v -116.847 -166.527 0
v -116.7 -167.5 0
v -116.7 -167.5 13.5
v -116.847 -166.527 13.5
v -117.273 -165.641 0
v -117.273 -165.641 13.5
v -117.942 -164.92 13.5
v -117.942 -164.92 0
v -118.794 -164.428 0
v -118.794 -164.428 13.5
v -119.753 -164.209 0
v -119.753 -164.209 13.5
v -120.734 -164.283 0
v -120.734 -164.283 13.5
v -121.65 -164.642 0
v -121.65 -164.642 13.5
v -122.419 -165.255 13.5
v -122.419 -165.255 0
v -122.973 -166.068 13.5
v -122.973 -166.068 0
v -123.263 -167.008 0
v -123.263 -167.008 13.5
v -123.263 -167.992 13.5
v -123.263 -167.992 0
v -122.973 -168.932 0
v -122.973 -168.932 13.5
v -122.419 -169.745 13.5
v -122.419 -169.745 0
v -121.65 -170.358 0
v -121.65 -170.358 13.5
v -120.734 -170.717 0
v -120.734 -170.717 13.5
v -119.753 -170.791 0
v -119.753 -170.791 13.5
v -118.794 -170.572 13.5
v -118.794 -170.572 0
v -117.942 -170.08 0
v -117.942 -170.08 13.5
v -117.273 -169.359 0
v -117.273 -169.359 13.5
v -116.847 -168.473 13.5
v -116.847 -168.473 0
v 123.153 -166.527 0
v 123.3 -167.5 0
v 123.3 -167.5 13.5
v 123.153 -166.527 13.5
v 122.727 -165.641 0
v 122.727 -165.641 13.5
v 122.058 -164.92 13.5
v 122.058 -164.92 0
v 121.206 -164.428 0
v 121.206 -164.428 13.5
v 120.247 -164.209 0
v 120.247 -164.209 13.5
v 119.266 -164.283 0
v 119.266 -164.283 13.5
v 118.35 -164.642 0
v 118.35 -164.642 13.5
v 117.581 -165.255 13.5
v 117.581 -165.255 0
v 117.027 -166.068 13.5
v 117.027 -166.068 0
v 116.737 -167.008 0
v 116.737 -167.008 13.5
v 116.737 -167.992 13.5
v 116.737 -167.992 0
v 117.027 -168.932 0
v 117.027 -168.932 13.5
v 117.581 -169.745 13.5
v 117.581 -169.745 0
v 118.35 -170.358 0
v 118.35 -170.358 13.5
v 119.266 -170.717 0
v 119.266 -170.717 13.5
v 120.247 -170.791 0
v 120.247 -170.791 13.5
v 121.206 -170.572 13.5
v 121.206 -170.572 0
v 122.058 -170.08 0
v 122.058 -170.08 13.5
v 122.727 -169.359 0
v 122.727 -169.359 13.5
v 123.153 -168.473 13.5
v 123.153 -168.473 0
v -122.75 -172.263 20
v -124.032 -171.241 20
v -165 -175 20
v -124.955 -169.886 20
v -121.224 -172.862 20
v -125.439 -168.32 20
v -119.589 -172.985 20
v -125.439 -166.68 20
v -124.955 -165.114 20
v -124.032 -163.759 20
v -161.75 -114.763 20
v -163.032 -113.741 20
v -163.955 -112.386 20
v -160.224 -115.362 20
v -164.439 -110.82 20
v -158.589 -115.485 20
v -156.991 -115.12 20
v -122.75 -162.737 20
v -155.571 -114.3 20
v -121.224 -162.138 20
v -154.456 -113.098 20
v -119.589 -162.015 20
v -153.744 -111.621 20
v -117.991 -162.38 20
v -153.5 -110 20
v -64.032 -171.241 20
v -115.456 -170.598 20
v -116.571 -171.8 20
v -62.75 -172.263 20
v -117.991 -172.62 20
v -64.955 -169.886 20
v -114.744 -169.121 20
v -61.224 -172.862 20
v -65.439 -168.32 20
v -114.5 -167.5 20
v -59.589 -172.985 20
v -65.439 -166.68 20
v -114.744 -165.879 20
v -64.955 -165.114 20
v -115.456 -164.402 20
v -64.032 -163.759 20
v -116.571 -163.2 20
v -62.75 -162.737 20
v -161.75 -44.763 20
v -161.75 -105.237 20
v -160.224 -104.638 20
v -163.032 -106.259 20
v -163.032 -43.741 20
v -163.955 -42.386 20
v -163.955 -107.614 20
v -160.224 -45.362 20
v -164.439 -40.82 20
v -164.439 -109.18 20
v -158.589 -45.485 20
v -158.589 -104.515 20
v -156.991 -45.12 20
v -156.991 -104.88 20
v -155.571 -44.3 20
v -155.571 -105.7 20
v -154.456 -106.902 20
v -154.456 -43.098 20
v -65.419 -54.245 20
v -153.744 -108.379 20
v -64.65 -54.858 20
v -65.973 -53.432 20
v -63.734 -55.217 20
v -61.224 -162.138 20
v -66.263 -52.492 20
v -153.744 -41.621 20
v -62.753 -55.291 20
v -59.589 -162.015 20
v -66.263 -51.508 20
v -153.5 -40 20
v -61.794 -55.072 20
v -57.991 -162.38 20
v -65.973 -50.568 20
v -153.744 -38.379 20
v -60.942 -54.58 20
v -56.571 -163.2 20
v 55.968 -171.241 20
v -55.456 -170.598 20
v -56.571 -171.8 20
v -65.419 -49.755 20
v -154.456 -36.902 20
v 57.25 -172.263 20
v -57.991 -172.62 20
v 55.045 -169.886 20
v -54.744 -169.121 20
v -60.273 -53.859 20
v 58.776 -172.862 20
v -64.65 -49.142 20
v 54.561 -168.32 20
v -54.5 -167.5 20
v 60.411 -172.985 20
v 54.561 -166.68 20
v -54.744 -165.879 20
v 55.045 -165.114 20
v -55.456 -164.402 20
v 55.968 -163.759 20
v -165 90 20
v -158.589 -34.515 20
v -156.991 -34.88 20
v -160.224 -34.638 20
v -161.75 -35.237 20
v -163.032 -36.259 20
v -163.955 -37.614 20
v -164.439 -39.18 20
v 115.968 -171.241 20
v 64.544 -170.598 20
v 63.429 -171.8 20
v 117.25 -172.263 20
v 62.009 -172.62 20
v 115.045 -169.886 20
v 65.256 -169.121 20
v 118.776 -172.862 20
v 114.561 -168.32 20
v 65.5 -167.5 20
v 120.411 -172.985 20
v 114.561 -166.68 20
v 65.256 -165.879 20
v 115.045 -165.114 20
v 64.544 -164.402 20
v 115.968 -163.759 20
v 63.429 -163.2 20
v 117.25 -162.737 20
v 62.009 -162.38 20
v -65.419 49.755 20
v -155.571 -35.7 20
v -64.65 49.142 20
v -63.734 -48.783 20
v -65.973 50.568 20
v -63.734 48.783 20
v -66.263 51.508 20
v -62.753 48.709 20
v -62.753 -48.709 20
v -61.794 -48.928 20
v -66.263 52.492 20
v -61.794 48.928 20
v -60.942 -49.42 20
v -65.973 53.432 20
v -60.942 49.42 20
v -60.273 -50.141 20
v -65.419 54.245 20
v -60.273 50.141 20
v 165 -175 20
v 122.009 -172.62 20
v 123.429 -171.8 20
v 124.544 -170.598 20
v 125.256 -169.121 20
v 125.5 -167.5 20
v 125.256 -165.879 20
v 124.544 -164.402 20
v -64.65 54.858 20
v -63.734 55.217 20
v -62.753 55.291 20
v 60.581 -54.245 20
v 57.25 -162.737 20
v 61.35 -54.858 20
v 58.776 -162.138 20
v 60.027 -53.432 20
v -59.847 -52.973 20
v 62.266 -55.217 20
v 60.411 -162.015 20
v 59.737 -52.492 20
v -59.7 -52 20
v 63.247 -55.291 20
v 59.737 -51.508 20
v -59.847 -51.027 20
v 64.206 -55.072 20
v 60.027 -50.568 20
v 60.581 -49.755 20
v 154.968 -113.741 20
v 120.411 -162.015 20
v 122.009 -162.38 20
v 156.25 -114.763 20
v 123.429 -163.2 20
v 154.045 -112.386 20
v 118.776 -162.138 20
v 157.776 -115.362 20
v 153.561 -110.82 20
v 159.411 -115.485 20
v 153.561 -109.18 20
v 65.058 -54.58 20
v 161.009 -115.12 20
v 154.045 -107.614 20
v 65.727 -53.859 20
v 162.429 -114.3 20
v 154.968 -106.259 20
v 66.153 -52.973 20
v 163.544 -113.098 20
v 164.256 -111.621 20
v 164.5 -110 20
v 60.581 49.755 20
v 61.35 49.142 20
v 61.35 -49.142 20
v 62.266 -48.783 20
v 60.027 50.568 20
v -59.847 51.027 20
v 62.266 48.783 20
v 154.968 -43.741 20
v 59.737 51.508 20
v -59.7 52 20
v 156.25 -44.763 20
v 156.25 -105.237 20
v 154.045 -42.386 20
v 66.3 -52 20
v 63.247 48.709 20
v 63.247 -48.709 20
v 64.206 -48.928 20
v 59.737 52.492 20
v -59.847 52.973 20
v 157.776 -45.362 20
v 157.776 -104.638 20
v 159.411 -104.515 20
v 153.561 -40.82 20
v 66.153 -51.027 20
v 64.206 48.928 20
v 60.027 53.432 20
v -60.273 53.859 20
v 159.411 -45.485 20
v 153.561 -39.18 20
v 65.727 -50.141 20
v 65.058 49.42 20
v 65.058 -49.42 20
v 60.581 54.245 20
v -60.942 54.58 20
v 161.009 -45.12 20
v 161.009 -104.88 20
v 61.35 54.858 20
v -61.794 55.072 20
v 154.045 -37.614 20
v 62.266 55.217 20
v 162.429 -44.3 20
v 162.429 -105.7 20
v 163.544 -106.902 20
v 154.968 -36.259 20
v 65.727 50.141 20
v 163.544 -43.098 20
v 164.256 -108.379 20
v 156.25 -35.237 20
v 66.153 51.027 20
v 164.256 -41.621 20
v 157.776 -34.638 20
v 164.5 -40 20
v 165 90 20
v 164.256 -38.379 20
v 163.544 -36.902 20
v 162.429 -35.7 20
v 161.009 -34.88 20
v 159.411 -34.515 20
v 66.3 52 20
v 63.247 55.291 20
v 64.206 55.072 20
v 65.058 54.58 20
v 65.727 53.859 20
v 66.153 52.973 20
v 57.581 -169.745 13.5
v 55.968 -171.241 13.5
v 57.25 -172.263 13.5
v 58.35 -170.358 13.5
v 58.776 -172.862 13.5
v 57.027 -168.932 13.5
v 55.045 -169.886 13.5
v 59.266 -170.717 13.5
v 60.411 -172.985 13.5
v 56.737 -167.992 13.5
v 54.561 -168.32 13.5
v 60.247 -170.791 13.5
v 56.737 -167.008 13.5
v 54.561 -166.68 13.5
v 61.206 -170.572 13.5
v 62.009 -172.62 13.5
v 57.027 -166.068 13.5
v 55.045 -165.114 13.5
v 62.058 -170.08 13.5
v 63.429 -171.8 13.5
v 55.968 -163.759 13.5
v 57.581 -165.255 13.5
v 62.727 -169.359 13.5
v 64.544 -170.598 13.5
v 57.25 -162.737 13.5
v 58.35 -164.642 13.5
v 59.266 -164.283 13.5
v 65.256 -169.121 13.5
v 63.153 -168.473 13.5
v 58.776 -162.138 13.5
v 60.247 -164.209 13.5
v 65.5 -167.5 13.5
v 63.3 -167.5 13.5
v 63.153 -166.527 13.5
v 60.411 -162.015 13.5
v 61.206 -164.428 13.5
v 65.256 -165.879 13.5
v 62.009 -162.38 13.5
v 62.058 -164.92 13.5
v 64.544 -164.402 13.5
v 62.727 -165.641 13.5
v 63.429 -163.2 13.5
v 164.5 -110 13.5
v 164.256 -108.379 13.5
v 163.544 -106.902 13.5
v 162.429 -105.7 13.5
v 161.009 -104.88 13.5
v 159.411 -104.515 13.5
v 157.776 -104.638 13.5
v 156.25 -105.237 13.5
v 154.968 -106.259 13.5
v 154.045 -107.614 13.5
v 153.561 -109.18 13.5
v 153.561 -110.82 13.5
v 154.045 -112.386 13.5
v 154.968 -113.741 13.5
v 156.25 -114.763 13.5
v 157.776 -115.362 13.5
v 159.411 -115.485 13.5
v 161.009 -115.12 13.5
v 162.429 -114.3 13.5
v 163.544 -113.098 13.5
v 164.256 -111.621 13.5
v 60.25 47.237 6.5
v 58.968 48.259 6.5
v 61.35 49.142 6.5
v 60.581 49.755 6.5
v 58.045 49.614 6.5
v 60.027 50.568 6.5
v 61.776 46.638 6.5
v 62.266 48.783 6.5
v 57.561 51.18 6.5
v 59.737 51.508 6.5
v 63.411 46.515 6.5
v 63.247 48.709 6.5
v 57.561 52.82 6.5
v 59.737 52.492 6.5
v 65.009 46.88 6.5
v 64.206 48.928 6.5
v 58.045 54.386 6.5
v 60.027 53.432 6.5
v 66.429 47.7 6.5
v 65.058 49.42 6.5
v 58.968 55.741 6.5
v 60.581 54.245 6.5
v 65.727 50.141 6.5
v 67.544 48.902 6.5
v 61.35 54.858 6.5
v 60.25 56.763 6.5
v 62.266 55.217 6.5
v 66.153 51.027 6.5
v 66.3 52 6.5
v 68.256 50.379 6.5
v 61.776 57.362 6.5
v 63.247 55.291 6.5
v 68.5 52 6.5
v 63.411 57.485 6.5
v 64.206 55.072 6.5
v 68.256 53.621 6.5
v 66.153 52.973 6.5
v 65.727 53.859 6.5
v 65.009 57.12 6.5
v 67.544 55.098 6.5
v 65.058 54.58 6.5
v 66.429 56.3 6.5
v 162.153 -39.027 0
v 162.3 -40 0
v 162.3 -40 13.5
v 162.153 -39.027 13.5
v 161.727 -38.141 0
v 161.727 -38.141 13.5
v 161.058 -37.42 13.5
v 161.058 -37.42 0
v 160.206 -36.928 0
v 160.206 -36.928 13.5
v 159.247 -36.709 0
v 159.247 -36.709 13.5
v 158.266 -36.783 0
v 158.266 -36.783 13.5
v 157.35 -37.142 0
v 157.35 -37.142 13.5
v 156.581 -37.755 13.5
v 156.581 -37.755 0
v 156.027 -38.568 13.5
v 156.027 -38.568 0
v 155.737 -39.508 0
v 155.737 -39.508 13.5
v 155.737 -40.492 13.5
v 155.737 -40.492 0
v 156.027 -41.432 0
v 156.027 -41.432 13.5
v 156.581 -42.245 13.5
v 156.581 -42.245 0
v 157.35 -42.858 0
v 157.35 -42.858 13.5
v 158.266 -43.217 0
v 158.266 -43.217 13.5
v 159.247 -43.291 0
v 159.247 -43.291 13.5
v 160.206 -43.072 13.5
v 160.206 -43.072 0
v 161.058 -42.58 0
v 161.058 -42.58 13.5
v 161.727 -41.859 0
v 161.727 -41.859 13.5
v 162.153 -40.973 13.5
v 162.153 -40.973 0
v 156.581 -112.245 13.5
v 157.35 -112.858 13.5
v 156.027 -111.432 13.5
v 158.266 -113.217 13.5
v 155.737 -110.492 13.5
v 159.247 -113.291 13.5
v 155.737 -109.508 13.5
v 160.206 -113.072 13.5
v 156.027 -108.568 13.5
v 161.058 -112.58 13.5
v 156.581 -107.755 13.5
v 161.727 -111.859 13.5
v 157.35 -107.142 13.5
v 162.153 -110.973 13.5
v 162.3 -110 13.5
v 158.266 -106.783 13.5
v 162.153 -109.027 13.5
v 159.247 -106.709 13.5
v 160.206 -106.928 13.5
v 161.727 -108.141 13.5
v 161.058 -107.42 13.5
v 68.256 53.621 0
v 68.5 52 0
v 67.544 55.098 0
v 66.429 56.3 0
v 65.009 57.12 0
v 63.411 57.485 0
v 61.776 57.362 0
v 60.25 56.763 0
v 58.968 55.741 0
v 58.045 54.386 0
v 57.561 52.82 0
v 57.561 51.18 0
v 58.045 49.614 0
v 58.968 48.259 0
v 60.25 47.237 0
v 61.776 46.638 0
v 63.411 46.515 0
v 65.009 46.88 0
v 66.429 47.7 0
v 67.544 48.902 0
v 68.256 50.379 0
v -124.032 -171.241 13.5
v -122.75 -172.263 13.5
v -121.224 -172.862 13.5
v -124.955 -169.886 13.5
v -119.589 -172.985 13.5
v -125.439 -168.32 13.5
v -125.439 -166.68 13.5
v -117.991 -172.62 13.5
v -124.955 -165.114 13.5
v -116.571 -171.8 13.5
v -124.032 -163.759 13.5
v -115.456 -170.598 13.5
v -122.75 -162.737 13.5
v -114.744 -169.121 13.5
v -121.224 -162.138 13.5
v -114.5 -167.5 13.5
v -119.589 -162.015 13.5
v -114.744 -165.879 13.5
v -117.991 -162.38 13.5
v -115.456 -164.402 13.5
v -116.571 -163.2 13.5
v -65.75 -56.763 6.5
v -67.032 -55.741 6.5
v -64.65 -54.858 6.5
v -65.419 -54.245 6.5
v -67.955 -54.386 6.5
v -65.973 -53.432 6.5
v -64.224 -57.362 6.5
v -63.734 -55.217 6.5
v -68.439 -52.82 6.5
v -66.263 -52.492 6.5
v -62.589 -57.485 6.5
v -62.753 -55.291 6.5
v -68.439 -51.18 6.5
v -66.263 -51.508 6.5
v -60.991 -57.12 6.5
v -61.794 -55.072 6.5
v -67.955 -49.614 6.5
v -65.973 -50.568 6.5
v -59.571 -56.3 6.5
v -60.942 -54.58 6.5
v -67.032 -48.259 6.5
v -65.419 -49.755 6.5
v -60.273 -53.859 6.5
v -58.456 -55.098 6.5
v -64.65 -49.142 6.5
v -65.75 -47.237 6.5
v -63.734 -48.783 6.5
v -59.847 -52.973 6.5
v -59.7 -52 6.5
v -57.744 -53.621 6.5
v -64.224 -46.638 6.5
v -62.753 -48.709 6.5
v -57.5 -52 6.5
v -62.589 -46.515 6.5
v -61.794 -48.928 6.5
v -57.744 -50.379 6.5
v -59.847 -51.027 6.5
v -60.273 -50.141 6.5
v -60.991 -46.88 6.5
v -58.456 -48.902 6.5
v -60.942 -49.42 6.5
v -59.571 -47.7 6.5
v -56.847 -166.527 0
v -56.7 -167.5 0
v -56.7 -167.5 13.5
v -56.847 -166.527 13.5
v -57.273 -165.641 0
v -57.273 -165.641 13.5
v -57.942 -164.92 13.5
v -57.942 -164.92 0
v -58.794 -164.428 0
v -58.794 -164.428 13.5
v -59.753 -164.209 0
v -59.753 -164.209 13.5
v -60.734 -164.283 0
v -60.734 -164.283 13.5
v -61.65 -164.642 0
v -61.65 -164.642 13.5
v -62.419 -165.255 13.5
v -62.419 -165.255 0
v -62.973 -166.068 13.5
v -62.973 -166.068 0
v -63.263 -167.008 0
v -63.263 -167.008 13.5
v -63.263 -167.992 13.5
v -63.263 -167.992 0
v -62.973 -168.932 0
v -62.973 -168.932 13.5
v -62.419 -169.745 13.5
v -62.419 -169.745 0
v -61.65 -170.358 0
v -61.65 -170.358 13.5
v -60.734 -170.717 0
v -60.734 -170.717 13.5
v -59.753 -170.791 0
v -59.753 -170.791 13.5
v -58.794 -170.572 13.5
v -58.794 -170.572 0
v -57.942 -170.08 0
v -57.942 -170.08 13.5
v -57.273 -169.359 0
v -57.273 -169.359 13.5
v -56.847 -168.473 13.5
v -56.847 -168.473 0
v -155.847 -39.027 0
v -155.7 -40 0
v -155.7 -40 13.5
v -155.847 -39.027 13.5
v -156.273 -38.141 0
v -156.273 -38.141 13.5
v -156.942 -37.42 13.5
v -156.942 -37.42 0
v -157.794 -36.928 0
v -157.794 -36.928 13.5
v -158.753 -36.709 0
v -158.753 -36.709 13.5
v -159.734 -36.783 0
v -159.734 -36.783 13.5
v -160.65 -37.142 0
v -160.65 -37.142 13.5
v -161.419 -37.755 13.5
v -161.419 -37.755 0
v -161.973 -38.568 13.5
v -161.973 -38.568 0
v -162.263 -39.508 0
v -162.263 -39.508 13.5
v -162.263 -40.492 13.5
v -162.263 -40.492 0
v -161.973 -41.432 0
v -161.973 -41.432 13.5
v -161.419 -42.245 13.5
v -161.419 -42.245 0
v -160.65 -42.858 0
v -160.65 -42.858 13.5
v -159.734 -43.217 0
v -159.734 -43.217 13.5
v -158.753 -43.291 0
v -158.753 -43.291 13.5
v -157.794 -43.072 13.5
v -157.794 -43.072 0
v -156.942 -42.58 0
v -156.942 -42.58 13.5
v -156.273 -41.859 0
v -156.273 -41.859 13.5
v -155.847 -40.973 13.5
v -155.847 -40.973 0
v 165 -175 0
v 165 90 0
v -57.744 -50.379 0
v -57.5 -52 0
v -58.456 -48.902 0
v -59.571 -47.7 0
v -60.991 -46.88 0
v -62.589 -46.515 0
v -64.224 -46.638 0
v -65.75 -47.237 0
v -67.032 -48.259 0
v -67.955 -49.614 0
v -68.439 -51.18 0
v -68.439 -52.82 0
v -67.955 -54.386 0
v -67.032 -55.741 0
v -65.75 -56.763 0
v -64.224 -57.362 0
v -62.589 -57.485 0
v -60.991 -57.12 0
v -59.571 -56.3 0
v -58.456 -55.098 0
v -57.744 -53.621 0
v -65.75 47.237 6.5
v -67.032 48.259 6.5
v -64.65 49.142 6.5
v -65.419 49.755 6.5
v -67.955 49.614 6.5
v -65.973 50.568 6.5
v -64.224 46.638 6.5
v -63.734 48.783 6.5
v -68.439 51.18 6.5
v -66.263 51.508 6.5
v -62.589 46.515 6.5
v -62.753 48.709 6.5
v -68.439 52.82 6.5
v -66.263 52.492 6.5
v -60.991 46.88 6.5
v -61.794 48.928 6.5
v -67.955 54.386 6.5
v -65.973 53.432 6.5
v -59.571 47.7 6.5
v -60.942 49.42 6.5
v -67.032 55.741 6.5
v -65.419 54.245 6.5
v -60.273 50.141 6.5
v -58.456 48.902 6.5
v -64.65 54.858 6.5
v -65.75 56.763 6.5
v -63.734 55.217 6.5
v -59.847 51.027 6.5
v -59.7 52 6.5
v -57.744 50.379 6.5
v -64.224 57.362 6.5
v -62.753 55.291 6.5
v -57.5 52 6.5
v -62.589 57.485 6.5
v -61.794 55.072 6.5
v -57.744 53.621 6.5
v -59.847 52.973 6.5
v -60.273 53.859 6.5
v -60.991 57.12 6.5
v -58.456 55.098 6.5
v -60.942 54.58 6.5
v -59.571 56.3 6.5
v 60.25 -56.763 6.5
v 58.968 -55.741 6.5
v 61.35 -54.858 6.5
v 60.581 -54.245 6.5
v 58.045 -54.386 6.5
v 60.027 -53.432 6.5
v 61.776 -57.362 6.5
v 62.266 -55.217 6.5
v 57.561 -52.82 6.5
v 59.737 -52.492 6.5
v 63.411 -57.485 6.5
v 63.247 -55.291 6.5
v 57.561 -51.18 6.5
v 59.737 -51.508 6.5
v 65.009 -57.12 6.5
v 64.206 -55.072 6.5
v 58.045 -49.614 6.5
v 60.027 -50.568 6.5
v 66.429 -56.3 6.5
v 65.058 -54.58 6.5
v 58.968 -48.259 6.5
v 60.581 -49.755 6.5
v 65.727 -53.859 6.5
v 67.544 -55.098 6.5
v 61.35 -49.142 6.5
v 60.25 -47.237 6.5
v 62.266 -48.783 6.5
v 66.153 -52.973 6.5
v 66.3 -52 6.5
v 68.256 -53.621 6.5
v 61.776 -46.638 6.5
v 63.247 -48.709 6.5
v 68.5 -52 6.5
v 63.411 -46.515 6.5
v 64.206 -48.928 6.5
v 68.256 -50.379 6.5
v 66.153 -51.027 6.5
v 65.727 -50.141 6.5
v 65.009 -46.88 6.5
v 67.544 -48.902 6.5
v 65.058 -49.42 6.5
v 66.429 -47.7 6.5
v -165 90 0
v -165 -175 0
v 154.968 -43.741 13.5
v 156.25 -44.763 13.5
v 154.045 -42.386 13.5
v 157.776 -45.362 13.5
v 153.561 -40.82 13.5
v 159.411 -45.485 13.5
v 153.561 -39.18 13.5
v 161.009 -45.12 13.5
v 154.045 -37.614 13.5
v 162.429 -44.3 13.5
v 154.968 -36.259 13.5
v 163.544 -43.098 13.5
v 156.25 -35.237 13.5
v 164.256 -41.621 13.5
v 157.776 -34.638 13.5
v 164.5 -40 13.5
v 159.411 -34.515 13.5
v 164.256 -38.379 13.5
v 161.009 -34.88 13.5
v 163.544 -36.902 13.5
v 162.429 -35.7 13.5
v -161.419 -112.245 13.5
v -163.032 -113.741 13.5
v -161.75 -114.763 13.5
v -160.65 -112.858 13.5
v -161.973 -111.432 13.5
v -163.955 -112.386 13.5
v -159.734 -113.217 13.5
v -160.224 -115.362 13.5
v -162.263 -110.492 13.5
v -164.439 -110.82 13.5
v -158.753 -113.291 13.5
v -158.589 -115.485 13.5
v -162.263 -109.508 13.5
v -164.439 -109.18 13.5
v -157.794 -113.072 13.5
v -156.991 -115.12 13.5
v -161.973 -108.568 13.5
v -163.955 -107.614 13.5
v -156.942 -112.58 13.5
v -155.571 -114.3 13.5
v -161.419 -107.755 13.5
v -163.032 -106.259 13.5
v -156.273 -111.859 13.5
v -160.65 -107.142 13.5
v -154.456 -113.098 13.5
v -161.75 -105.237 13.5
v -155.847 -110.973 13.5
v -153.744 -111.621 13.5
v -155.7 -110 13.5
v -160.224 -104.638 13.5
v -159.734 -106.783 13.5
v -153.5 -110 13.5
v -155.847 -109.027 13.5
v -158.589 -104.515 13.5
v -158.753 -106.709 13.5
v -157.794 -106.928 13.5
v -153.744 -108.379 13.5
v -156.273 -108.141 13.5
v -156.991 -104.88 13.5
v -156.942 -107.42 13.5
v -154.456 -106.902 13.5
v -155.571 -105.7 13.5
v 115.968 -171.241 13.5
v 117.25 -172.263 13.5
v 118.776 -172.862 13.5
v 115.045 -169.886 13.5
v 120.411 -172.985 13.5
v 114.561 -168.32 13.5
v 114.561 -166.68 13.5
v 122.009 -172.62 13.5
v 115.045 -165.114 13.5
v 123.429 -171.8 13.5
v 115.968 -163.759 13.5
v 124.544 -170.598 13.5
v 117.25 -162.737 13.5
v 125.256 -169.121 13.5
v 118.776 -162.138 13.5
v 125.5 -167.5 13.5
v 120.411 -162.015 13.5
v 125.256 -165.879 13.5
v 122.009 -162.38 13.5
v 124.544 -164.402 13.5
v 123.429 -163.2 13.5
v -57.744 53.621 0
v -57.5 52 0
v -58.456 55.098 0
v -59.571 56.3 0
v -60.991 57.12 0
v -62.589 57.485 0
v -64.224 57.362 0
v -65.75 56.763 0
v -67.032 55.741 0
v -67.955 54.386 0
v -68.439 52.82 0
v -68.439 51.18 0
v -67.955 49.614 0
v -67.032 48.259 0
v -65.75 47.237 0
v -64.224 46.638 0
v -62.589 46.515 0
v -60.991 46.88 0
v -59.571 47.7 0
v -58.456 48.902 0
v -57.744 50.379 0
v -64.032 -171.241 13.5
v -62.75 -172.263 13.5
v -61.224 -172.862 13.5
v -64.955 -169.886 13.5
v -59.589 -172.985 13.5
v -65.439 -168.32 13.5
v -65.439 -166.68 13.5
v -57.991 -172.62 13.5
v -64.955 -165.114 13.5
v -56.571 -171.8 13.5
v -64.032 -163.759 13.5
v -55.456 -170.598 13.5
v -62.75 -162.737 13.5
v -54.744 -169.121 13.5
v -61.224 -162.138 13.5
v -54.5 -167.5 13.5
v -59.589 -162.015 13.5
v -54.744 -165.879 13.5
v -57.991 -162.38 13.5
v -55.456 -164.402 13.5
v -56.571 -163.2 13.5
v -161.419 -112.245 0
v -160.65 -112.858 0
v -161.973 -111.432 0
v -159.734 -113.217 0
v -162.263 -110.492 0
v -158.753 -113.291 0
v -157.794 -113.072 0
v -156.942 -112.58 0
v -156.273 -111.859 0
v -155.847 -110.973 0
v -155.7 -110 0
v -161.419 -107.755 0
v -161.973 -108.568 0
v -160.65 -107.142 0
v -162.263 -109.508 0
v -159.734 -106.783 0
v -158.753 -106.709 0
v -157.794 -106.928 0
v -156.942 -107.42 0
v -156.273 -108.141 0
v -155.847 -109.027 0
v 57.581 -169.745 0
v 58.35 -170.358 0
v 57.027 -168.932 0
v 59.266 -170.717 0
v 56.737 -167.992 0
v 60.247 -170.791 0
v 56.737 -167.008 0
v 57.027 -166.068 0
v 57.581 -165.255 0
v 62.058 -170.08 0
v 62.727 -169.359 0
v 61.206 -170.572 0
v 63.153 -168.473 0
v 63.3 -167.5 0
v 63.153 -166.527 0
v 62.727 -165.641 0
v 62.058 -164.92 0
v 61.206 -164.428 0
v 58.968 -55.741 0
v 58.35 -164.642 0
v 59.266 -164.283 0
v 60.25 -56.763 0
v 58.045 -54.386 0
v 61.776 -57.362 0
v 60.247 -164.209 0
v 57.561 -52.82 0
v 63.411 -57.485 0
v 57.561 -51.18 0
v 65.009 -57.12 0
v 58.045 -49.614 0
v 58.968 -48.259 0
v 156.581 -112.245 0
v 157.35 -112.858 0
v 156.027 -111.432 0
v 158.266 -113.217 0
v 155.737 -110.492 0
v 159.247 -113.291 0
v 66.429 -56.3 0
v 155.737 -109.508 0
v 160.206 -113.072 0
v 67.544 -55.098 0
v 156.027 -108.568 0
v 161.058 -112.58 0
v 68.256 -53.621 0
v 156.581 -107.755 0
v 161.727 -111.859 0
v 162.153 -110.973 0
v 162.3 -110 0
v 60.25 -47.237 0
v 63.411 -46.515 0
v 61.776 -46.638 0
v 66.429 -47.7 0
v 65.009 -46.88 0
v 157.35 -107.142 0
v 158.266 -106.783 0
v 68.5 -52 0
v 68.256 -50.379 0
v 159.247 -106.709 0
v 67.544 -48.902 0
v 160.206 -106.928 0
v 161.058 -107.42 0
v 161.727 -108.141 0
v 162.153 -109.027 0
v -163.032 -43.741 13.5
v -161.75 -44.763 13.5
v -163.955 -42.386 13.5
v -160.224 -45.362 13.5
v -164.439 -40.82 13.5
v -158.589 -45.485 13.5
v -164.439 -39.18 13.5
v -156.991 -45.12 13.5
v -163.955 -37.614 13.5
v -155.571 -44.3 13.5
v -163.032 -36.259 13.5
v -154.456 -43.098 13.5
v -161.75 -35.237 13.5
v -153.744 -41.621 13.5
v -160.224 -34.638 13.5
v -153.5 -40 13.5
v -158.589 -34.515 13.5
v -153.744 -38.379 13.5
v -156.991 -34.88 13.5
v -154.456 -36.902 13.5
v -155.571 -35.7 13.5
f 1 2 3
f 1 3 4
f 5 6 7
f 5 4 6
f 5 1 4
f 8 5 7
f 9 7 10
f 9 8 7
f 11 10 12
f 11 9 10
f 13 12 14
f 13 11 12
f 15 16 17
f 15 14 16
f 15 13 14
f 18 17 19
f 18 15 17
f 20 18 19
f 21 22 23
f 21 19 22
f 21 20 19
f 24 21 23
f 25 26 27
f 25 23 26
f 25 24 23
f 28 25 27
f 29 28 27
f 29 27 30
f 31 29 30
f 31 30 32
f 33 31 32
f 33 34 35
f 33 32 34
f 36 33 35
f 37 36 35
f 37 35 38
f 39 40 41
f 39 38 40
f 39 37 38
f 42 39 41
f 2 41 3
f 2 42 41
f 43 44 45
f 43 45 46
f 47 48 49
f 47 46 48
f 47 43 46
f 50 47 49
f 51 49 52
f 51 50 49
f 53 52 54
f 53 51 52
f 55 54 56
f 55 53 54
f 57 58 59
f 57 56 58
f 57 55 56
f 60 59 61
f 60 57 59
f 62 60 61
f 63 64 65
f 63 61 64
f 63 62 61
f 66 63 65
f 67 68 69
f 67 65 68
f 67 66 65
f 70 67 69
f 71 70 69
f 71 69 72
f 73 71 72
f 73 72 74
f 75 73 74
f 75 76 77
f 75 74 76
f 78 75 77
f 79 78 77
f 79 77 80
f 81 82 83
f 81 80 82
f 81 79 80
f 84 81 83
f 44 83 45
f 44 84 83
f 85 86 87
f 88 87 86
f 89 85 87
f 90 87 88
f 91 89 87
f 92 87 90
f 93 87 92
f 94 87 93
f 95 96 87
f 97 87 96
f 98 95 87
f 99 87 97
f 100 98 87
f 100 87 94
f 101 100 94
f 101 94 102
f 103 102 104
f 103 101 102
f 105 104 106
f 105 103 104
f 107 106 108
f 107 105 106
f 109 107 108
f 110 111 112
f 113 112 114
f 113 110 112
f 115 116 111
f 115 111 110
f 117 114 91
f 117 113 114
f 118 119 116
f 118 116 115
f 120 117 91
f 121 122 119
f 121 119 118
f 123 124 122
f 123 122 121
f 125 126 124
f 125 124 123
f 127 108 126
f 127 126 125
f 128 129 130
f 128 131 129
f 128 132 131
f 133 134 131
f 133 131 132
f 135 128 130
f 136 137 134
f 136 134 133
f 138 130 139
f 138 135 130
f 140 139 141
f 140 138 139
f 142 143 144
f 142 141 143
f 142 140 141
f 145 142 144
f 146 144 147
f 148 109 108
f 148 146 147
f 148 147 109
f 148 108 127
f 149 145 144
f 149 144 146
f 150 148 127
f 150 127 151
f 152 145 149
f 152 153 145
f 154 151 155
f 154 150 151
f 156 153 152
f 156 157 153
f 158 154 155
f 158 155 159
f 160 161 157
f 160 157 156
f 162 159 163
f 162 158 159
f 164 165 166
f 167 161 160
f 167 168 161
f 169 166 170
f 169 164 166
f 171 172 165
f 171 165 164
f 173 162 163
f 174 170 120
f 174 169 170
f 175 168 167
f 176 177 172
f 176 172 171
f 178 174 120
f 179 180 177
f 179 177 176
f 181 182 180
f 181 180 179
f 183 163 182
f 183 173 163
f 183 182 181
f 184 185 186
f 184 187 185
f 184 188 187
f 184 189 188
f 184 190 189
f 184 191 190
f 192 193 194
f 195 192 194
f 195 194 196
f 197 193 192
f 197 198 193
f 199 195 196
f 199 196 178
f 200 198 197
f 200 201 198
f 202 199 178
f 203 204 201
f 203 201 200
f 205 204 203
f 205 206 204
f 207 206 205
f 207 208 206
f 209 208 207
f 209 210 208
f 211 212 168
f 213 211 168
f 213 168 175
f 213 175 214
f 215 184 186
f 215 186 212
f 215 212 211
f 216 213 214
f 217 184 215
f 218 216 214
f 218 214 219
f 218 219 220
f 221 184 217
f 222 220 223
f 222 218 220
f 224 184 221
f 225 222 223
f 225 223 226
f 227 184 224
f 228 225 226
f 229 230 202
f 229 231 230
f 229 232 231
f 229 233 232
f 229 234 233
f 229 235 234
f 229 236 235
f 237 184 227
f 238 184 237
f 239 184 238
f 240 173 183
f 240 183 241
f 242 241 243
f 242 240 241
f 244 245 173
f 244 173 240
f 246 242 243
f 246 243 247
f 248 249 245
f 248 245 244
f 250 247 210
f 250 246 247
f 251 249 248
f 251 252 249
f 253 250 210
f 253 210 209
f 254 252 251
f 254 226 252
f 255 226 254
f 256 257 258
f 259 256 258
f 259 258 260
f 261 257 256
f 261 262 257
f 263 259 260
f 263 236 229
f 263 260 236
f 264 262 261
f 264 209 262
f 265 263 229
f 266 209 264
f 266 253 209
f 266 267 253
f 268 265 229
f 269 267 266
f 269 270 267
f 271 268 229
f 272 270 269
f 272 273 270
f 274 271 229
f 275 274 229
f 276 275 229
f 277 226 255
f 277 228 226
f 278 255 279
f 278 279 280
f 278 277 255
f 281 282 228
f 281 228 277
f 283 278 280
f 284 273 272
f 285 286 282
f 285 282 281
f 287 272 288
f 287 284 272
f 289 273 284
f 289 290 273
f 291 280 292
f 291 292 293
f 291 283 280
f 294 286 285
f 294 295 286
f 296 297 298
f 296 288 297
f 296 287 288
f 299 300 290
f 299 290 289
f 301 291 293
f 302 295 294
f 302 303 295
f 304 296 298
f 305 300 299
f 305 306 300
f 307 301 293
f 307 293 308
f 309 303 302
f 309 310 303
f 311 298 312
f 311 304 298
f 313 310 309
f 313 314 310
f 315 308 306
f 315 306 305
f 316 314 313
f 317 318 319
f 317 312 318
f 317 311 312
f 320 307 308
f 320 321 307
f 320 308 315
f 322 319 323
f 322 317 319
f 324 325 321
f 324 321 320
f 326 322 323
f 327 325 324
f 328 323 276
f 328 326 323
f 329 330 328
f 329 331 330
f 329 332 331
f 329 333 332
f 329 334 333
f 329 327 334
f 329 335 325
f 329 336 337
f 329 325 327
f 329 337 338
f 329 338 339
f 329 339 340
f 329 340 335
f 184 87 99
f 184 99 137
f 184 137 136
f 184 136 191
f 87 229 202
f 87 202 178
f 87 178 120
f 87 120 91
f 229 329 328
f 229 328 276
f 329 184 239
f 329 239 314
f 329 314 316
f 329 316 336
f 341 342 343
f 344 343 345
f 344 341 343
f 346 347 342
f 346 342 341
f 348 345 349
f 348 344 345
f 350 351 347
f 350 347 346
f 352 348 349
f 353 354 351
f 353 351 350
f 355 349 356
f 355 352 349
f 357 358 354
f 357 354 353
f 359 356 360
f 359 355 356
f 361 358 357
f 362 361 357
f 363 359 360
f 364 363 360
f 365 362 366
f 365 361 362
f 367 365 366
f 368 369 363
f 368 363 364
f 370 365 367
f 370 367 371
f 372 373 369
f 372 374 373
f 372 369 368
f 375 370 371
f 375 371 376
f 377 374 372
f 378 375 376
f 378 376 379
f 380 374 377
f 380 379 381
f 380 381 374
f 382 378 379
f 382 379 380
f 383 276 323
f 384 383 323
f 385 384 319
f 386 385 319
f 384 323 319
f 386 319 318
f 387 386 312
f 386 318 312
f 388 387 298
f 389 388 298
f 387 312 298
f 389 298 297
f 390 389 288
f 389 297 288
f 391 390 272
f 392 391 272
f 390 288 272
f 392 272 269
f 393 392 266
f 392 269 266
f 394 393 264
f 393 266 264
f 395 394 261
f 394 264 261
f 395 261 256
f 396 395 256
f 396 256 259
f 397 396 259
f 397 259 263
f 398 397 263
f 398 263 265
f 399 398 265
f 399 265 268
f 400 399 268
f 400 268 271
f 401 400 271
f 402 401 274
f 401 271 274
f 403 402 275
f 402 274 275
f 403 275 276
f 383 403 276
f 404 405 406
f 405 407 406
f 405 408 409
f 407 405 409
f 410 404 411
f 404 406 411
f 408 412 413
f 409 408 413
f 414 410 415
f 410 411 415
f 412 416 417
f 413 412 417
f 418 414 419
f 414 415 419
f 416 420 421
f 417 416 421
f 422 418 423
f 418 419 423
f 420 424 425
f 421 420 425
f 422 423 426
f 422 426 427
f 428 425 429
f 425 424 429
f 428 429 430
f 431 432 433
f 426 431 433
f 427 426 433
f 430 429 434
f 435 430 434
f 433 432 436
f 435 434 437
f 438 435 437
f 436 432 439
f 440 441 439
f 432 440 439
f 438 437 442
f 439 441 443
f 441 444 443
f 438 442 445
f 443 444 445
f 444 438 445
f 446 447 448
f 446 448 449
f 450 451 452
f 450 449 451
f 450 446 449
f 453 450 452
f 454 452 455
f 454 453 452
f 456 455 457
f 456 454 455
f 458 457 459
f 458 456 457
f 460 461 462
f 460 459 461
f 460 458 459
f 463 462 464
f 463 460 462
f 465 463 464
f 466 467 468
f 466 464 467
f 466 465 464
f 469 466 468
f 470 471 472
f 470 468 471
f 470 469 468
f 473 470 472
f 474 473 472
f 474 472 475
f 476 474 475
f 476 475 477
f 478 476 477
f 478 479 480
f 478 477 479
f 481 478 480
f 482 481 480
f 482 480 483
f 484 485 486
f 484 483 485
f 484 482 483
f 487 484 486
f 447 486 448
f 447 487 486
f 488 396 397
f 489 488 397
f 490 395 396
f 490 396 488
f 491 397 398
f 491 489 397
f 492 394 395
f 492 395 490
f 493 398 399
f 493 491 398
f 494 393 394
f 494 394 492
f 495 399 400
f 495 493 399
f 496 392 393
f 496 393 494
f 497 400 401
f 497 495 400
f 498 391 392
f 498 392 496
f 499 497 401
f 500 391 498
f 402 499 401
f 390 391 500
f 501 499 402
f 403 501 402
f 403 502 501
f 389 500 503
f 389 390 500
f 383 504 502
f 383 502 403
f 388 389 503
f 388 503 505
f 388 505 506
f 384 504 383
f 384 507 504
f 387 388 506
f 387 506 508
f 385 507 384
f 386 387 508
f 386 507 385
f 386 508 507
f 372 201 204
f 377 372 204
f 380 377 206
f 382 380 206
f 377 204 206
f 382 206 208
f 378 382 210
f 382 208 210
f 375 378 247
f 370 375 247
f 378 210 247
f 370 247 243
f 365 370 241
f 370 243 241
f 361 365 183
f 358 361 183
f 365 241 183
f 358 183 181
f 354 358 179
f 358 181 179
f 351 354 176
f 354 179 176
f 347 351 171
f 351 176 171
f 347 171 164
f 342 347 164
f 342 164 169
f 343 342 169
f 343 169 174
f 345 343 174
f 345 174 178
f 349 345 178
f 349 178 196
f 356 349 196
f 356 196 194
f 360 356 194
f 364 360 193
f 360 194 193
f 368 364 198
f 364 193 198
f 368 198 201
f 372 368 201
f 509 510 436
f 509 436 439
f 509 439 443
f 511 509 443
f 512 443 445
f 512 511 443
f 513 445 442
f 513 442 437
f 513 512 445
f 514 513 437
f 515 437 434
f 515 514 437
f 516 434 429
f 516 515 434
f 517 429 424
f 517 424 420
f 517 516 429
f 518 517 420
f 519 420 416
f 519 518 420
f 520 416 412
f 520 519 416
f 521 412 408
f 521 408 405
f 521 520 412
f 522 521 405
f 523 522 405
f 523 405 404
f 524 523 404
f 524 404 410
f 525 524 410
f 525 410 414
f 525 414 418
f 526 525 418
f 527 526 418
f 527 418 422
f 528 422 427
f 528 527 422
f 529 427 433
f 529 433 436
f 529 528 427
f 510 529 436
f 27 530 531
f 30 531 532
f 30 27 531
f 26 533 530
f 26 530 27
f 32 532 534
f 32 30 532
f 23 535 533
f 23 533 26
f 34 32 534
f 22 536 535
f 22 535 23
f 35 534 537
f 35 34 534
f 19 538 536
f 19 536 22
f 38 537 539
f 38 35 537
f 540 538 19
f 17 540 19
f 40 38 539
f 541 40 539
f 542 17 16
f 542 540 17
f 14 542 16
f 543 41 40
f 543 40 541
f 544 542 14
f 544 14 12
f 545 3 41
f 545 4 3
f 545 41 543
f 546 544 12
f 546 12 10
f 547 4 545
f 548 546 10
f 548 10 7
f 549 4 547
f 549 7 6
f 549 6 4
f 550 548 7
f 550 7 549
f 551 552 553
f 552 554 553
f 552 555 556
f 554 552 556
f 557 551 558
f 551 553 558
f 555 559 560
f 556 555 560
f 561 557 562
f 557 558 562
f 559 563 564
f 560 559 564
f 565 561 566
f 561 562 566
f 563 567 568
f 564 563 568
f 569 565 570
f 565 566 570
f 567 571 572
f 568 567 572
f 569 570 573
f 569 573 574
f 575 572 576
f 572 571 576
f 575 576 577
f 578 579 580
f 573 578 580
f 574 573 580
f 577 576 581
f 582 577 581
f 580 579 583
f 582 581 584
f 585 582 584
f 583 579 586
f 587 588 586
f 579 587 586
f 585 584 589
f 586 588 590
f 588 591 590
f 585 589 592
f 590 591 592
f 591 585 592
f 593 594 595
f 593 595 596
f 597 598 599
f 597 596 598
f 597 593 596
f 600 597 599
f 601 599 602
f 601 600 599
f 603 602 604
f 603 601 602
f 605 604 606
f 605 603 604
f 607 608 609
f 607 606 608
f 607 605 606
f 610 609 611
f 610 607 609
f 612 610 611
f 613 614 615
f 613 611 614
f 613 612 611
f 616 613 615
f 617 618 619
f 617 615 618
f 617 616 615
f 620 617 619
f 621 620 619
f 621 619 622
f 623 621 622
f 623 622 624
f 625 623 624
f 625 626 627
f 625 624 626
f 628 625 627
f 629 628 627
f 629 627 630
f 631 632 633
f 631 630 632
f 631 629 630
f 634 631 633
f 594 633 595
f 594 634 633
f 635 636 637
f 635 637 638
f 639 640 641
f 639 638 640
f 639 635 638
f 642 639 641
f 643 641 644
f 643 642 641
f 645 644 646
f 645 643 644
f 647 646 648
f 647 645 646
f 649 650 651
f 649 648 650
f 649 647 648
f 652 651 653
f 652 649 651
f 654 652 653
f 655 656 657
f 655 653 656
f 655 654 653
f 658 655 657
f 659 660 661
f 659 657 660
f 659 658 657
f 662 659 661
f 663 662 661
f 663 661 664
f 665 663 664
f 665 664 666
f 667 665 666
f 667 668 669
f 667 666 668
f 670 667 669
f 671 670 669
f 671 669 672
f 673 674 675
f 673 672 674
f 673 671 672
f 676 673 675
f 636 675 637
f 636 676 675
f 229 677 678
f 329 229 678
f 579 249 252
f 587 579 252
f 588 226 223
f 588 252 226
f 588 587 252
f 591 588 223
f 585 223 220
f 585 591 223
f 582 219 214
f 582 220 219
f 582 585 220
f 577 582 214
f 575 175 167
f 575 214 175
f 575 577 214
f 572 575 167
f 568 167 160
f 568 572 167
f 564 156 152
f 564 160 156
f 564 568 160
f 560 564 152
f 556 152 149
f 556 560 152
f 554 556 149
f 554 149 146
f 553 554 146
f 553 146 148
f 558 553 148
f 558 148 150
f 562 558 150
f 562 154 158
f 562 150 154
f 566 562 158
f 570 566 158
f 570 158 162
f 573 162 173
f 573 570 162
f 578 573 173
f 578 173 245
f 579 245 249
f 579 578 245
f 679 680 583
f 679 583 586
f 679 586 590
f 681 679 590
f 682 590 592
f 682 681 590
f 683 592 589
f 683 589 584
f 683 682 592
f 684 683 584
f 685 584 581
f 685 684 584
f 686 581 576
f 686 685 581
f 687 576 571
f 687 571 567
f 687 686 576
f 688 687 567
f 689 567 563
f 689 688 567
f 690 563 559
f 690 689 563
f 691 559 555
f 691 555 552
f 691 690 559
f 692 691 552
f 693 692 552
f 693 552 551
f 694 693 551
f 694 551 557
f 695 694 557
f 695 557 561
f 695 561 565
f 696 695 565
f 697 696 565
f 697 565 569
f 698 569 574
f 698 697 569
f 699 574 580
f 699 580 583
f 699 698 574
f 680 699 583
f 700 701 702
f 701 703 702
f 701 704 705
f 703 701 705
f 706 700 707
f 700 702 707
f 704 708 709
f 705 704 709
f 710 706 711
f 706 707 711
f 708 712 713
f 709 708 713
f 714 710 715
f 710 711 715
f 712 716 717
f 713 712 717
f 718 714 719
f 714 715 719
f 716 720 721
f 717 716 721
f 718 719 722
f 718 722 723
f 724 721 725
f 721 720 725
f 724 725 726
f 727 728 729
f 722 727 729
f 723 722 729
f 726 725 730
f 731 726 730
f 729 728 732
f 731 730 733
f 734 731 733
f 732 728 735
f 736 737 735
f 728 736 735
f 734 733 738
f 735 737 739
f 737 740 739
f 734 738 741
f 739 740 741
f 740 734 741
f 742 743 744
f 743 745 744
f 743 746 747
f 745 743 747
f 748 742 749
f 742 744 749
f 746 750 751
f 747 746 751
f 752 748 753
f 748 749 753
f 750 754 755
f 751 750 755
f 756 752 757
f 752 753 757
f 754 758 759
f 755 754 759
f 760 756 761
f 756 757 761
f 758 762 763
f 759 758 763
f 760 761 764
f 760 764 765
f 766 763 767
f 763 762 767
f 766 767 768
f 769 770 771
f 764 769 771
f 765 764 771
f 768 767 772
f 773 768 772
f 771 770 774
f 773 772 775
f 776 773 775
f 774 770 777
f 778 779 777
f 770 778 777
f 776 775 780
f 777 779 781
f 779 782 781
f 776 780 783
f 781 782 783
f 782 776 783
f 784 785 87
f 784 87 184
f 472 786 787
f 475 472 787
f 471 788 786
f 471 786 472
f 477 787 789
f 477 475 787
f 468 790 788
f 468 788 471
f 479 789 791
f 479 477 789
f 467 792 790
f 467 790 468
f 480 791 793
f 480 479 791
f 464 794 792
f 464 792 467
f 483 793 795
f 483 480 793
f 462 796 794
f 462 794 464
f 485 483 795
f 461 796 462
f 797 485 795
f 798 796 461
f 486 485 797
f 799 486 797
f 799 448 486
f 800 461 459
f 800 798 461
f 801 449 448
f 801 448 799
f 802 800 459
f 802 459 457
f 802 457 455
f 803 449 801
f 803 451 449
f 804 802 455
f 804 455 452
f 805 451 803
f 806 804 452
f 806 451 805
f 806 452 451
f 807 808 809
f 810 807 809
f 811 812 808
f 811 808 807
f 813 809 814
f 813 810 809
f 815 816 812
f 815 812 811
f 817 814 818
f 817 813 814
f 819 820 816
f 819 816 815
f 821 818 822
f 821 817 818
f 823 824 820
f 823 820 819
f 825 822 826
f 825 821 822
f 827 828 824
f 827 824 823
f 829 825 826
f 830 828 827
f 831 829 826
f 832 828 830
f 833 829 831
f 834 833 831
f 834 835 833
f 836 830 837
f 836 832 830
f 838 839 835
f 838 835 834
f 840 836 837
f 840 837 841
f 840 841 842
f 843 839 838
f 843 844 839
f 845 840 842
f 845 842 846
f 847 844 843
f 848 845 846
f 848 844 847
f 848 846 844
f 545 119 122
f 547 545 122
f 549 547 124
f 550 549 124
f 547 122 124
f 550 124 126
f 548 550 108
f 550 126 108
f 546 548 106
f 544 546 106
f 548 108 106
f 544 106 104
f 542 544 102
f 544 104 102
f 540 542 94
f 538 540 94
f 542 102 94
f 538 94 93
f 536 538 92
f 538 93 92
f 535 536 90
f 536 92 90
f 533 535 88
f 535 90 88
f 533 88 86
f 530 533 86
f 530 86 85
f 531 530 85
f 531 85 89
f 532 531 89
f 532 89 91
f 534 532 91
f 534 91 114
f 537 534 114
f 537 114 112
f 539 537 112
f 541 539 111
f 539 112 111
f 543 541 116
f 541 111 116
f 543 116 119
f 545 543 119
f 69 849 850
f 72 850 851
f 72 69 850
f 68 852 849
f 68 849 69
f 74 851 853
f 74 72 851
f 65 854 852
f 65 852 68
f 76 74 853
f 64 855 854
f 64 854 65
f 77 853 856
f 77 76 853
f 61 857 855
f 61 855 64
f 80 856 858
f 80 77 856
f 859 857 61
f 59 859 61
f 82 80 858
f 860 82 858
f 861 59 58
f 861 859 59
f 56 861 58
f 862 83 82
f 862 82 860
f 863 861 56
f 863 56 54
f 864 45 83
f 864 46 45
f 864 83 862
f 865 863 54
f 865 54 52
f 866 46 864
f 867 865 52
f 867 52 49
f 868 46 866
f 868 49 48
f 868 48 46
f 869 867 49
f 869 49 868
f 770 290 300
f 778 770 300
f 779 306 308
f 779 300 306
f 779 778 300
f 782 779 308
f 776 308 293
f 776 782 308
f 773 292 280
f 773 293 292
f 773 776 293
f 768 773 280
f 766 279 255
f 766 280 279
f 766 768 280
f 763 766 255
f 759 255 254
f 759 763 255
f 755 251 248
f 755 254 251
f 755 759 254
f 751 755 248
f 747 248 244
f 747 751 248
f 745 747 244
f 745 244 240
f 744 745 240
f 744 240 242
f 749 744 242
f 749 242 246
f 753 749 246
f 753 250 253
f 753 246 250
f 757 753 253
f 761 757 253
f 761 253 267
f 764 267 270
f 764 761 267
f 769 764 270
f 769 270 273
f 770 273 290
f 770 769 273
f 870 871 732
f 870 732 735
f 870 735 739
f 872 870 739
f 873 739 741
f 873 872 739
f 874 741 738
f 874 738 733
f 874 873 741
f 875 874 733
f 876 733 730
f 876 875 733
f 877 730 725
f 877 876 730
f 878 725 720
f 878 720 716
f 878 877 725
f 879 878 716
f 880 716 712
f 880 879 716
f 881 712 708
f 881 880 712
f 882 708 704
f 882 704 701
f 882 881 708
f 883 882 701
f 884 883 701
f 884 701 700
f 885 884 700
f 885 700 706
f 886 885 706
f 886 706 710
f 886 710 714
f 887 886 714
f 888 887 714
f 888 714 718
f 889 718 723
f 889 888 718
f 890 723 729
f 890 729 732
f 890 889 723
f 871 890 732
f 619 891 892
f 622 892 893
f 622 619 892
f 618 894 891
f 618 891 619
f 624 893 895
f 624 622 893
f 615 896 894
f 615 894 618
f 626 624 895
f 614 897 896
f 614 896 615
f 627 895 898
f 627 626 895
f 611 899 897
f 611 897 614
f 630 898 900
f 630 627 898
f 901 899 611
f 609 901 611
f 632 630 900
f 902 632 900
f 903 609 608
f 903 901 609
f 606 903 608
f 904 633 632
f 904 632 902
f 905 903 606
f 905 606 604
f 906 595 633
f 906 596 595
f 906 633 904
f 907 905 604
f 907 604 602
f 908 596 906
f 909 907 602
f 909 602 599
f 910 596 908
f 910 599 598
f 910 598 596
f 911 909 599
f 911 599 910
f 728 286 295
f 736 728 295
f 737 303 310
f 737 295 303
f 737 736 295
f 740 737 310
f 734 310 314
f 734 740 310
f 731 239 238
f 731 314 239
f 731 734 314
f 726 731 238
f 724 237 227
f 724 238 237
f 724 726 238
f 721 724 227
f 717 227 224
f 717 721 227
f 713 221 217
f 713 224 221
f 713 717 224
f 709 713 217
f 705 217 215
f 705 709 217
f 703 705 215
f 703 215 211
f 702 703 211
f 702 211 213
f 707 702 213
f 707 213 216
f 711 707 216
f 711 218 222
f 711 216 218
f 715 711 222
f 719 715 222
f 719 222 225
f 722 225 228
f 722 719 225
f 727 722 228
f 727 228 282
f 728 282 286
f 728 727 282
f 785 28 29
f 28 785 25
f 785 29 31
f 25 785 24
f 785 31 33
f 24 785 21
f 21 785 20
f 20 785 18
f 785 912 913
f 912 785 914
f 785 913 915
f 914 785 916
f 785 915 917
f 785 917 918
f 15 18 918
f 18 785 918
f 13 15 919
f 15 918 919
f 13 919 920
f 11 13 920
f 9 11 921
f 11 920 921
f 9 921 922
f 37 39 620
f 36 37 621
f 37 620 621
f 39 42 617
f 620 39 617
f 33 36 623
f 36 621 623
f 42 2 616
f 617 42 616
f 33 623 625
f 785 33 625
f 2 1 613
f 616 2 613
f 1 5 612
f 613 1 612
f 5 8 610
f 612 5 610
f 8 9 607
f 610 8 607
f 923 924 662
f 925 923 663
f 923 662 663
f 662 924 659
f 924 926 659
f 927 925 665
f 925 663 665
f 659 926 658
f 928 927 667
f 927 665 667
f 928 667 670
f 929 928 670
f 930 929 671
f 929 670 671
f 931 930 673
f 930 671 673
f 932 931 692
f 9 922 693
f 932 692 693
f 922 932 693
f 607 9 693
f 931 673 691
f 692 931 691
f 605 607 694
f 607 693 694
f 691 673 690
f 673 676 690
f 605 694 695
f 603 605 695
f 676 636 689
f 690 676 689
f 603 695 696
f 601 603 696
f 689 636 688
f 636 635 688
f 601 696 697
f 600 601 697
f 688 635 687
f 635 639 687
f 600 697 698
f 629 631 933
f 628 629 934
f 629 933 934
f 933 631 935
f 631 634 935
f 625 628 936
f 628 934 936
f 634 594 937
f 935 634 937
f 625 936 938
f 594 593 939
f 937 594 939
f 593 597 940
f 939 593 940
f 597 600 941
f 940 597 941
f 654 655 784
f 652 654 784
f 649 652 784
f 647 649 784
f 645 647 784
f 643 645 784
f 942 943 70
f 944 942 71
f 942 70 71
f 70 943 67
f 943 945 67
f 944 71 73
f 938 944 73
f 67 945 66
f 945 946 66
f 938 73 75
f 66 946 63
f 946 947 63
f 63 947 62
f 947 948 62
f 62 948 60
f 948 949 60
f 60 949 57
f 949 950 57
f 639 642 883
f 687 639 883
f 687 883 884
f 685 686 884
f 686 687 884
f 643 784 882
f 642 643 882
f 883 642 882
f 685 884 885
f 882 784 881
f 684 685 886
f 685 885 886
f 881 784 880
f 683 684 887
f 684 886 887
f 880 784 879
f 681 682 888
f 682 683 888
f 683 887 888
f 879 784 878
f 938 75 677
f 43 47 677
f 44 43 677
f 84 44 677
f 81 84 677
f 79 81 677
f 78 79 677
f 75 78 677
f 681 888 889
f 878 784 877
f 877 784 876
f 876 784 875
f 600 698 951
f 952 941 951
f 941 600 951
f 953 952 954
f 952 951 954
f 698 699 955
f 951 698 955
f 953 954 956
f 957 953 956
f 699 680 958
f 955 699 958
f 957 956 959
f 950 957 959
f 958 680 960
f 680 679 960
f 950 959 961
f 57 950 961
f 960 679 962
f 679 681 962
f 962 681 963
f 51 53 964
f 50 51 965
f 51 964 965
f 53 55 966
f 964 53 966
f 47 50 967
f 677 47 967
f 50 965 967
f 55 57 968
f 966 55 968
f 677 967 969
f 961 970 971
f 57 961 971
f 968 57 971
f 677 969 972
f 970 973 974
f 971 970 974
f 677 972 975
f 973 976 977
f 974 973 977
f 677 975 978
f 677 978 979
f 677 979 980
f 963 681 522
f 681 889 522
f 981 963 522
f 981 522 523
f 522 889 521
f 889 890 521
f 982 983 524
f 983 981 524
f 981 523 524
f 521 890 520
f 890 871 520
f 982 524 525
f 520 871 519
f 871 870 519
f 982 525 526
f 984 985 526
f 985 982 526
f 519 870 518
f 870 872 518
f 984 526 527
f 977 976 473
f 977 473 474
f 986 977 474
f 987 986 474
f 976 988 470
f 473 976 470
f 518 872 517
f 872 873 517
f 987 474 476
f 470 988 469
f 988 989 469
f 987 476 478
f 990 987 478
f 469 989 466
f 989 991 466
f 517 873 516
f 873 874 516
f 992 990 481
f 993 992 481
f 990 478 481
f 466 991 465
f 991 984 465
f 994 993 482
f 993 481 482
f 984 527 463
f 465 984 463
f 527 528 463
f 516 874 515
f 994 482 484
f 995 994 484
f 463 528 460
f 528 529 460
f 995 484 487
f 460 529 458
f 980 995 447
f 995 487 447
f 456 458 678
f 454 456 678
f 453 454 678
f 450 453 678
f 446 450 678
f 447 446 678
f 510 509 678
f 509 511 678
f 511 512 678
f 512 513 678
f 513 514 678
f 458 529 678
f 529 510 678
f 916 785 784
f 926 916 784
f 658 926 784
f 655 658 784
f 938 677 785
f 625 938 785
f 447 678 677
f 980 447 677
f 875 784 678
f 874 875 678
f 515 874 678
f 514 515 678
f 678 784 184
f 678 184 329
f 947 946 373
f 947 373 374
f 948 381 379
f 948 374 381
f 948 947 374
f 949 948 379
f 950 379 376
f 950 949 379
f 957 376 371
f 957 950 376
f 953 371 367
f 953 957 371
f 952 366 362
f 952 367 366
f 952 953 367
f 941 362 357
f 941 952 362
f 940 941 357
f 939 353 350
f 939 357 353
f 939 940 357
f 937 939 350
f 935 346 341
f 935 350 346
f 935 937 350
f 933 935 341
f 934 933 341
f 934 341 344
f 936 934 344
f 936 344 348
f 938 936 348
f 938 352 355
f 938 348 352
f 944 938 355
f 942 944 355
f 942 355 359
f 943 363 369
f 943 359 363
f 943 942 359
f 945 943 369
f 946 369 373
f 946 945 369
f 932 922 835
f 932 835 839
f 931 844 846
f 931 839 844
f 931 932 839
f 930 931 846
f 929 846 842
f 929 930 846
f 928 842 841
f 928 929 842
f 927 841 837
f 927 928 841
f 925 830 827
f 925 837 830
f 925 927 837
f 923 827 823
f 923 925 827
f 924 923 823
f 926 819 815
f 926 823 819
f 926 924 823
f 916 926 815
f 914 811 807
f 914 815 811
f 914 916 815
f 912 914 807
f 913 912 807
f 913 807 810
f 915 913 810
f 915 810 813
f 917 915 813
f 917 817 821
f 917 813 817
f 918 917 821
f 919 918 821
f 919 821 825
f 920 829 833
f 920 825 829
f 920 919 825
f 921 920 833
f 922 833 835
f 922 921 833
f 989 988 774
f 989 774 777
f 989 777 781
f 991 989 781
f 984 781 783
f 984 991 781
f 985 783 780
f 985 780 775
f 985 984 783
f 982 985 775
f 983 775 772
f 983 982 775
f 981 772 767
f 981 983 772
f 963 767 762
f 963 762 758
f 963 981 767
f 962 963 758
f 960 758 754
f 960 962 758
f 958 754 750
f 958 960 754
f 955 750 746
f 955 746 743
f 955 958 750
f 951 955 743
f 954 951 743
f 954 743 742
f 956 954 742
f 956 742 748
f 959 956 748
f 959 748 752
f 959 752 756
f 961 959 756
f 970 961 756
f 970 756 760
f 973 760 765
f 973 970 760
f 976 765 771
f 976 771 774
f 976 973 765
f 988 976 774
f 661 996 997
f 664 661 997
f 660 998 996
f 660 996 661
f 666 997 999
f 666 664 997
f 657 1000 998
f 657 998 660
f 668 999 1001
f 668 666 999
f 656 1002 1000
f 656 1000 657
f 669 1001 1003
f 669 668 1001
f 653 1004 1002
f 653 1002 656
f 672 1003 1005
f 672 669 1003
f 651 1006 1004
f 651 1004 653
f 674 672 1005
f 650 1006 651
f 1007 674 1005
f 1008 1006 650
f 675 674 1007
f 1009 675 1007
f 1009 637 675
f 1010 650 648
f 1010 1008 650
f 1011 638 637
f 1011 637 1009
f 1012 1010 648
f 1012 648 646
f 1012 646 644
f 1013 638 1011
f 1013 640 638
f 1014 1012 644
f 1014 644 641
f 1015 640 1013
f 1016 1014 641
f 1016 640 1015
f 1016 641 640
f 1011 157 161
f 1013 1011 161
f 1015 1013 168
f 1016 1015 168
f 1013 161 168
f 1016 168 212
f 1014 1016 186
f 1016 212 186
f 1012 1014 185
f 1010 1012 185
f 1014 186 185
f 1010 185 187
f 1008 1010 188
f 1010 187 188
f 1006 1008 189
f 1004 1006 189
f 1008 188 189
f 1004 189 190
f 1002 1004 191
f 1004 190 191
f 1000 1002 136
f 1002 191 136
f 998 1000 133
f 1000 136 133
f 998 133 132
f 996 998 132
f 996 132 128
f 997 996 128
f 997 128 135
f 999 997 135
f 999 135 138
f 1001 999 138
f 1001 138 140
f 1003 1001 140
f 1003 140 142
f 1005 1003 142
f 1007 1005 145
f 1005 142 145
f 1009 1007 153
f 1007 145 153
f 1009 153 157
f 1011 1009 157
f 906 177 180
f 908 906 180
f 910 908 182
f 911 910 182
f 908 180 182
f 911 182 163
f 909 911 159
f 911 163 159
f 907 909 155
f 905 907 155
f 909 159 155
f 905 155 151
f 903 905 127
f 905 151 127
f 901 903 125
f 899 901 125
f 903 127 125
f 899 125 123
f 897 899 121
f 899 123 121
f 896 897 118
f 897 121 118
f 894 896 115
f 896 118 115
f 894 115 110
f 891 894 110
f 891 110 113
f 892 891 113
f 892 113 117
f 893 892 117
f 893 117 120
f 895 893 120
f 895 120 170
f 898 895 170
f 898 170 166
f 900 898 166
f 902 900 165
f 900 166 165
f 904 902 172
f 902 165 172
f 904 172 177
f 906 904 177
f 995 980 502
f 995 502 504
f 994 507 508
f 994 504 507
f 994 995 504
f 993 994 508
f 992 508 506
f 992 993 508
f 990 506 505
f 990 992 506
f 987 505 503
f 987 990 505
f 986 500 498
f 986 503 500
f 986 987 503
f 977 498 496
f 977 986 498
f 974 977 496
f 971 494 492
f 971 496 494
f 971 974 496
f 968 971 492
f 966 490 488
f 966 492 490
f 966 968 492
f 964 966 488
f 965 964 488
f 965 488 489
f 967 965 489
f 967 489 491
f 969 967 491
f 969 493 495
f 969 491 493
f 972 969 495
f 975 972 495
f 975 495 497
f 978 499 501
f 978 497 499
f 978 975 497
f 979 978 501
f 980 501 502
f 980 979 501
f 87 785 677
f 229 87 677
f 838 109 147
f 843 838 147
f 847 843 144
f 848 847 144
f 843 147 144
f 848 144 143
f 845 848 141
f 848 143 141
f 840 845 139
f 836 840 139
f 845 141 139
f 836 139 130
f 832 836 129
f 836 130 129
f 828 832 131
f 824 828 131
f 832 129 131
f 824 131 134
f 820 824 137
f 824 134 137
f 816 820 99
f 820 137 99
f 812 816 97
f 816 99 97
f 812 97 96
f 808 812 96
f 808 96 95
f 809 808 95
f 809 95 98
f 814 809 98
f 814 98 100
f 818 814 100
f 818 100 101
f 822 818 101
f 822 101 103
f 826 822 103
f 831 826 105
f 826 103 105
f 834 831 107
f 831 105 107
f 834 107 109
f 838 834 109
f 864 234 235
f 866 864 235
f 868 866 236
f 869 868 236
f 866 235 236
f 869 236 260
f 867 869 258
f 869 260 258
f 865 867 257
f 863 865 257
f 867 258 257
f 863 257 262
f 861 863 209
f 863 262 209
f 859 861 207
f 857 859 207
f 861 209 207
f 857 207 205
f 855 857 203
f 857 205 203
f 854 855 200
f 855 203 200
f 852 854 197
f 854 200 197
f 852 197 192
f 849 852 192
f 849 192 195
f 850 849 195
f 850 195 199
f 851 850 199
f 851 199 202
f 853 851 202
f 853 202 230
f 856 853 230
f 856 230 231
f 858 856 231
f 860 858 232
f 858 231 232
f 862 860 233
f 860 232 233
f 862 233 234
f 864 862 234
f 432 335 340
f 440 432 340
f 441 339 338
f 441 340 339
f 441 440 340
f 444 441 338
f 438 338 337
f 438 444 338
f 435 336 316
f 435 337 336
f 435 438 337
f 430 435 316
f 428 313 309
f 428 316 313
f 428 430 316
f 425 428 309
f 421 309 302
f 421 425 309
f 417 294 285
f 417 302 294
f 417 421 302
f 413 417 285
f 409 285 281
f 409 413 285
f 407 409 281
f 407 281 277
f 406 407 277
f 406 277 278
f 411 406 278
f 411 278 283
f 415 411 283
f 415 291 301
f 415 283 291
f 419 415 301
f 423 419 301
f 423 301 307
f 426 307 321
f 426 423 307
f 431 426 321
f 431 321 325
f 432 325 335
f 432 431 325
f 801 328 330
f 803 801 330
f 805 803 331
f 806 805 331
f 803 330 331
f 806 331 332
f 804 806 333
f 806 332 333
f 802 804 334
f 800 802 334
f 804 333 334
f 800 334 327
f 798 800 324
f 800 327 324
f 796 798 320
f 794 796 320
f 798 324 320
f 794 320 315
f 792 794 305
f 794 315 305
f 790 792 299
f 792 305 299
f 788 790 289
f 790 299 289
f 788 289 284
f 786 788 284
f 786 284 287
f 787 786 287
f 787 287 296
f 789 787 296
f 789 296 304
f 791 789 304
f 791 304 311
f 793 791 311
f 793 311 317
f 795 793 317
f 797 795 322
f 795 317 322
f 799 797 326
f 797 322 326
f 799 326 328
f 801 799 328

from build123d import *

# Parameters (mm, degrees)
SKETCH1_W               = 330
SKETCH1_H               = 265
BOSS_EXTRUDE1_DEPTH     = 20
CUT_EXTRUDE1_DEPTH      = 242.350367723
CUT_EXTRUDE1_DEPTH_BACK = 242.350367723
SKETCH2_R               = 3.3
SKETCH3_R               = 5.5
CUT_EXTRUDE3_DEPTH      = 6.5
CUT_EXTRUDE4_DEPTH      = 242.350367723
CUT_EXTRUDE4_DEPTH_BACK = 242.350367723
SKETCH4_R               = 3.3
SKETCH5_R               = 5.5
CUT_EXTRUDE6_DEPTH      = 6.5
CUT_EXTRUDE7_DEPTH      = 242.350367723
CUT_EXTRUDE7_DEPTH_BACK = 242.350367723
SKETCH6_R               = 3.3
SKETCH7_R               = 5.5
CUT_EXTRUDE9_DEPTH      = 6.5


with BuildPart() as part:
    # Sketch1 → Boss-Extrude1 (new body)
    with BuildSketch(Plane.XY):
        with Locations((0, -42.5)):
            Rectangle(SKETCH1_W, SKETCH1_H)
    extrude(amount=BOSS_EXTRUDE1_DEPTH)

    # Sketch2 → Cut-Extrude1 (cut, two sides: drawn at the far end of the back side and taken through both)
    with BuildSketch(Plane.XY.offset(-CUT_EXTRUDE1_DEPTH_BACK)):
        with Locations((-63, -52)):
            Circle(SKETCH2_R)
        with Locations((-63, 52)):
            Circle(SKETCH2_R)
        with Locations((63, -52)):
            Circle(SKETCH2_R)
        with Locations((63, 52)):
            Circle(SKETCH2_R)
    extrude(amount=CUT_EXTRUDE1_DEPTH + CUT_EXTRUDE1_DEPTH_BACK, mode=Mode.SUBTRACT)

    # Sketch3 → Cut-Extrude3 (cut)
    with BuildSketch(Plane.XY):
        with Locations((-63, -52)):
            Circle(SKETCH3_R)
        with Locations((-63, 52)):
            Circle(SKETCH3_R)
        with Locations((63, -52)):
            Circle(SKETCH3_R)
        with Locations((63, 52)):
            Circle(SKETCH3_R)
    extrude(amount=CUT_EXTRUDE3_DEPTH, mode=Mode.SUBTRACT)

    # Sketch4 → Cut-Extrude4 (cut, two sides: drawn at the far end of the back side and taken through both)
    with BuildSketch(Plane.XY.offset(-CUT_EXTRUDE4_DEPTH_BACK)):
        with Locations((-120, -167.5)):
            Circle(SKETCH4_R)
        with Locations((-60, -167.5)):
            Circle(SKETCH4_R)
        with Locations((60, -167.5)):
            Circle(SKETCH4_R)
        with Locations((120, -167.5)):
            Circle(SKETCH4_R)
    extrude(amount=CUT_EXTRUDE4_DEPTH + CUT_EXTRUDE4_DEPTH_BACK, mode=Mode.SUBTRACT)

    # Sketch5 → Cut-Extrude6 (cut)
    with BuildSketch(Plane.XY.offset(20)):
        with Locations((-120, -167.5)):
            Circle(SKETCH5_R)
        with Locations((-60, -167.5)):
            Circle(SKETCH5_R)
        with Locations((60, -167.5)):
            Circle(SKETCH5_R)
        with Locations((120, -167.5)):
            Circle(SKETCH5_R)
    extrude(amount=-CUT_EXTRUDE6_DEPTH, mode=Mode.SUBTRACT)

    # Sketch6 → Cut-Extrude7 (cut, two sides: drawn at the far end of the back side and taken through both)
    with BuildSketch(Plane.XY.offset(-CUT_EXTRUDE7_DEPTH_BACK)):
        with Locations((-159, -110)):
            Circle(SKETCH6_R)
        with Locations((-159, -40)):
            Circle(SKETCH6_R)
        with Locations((159, -110)):
            Circle(SKETCH6_R)
        with Locations((159, -40)):
            Circle(SKETCH6_R)
    extrude(amount=CUT_EXTRUDE7_DEPTH + CUT_EXTRUDE7_DEPTH_BACK, mode=Mode.SUBTRACT)

    # Sketch7 → Cut-Extrude9 (cut)
    with BuildSketch(Plane.XY.offset(20)):
        with Locations((-159, -110)):
            Circle(SKETCH7_R)
        with Locations((-159, -40)):
            Circle(SKETCH7_R)
        with Locations((159, -110)):
            Circle(SKETCH7_R)
        with Locations((159, -40)):
            Circle(SKETCH7_R)
    extrude(amount=-CUT_EXTRUDE9_DEPTH, mode=Mode.SUBTRACT)


solid = part.part
